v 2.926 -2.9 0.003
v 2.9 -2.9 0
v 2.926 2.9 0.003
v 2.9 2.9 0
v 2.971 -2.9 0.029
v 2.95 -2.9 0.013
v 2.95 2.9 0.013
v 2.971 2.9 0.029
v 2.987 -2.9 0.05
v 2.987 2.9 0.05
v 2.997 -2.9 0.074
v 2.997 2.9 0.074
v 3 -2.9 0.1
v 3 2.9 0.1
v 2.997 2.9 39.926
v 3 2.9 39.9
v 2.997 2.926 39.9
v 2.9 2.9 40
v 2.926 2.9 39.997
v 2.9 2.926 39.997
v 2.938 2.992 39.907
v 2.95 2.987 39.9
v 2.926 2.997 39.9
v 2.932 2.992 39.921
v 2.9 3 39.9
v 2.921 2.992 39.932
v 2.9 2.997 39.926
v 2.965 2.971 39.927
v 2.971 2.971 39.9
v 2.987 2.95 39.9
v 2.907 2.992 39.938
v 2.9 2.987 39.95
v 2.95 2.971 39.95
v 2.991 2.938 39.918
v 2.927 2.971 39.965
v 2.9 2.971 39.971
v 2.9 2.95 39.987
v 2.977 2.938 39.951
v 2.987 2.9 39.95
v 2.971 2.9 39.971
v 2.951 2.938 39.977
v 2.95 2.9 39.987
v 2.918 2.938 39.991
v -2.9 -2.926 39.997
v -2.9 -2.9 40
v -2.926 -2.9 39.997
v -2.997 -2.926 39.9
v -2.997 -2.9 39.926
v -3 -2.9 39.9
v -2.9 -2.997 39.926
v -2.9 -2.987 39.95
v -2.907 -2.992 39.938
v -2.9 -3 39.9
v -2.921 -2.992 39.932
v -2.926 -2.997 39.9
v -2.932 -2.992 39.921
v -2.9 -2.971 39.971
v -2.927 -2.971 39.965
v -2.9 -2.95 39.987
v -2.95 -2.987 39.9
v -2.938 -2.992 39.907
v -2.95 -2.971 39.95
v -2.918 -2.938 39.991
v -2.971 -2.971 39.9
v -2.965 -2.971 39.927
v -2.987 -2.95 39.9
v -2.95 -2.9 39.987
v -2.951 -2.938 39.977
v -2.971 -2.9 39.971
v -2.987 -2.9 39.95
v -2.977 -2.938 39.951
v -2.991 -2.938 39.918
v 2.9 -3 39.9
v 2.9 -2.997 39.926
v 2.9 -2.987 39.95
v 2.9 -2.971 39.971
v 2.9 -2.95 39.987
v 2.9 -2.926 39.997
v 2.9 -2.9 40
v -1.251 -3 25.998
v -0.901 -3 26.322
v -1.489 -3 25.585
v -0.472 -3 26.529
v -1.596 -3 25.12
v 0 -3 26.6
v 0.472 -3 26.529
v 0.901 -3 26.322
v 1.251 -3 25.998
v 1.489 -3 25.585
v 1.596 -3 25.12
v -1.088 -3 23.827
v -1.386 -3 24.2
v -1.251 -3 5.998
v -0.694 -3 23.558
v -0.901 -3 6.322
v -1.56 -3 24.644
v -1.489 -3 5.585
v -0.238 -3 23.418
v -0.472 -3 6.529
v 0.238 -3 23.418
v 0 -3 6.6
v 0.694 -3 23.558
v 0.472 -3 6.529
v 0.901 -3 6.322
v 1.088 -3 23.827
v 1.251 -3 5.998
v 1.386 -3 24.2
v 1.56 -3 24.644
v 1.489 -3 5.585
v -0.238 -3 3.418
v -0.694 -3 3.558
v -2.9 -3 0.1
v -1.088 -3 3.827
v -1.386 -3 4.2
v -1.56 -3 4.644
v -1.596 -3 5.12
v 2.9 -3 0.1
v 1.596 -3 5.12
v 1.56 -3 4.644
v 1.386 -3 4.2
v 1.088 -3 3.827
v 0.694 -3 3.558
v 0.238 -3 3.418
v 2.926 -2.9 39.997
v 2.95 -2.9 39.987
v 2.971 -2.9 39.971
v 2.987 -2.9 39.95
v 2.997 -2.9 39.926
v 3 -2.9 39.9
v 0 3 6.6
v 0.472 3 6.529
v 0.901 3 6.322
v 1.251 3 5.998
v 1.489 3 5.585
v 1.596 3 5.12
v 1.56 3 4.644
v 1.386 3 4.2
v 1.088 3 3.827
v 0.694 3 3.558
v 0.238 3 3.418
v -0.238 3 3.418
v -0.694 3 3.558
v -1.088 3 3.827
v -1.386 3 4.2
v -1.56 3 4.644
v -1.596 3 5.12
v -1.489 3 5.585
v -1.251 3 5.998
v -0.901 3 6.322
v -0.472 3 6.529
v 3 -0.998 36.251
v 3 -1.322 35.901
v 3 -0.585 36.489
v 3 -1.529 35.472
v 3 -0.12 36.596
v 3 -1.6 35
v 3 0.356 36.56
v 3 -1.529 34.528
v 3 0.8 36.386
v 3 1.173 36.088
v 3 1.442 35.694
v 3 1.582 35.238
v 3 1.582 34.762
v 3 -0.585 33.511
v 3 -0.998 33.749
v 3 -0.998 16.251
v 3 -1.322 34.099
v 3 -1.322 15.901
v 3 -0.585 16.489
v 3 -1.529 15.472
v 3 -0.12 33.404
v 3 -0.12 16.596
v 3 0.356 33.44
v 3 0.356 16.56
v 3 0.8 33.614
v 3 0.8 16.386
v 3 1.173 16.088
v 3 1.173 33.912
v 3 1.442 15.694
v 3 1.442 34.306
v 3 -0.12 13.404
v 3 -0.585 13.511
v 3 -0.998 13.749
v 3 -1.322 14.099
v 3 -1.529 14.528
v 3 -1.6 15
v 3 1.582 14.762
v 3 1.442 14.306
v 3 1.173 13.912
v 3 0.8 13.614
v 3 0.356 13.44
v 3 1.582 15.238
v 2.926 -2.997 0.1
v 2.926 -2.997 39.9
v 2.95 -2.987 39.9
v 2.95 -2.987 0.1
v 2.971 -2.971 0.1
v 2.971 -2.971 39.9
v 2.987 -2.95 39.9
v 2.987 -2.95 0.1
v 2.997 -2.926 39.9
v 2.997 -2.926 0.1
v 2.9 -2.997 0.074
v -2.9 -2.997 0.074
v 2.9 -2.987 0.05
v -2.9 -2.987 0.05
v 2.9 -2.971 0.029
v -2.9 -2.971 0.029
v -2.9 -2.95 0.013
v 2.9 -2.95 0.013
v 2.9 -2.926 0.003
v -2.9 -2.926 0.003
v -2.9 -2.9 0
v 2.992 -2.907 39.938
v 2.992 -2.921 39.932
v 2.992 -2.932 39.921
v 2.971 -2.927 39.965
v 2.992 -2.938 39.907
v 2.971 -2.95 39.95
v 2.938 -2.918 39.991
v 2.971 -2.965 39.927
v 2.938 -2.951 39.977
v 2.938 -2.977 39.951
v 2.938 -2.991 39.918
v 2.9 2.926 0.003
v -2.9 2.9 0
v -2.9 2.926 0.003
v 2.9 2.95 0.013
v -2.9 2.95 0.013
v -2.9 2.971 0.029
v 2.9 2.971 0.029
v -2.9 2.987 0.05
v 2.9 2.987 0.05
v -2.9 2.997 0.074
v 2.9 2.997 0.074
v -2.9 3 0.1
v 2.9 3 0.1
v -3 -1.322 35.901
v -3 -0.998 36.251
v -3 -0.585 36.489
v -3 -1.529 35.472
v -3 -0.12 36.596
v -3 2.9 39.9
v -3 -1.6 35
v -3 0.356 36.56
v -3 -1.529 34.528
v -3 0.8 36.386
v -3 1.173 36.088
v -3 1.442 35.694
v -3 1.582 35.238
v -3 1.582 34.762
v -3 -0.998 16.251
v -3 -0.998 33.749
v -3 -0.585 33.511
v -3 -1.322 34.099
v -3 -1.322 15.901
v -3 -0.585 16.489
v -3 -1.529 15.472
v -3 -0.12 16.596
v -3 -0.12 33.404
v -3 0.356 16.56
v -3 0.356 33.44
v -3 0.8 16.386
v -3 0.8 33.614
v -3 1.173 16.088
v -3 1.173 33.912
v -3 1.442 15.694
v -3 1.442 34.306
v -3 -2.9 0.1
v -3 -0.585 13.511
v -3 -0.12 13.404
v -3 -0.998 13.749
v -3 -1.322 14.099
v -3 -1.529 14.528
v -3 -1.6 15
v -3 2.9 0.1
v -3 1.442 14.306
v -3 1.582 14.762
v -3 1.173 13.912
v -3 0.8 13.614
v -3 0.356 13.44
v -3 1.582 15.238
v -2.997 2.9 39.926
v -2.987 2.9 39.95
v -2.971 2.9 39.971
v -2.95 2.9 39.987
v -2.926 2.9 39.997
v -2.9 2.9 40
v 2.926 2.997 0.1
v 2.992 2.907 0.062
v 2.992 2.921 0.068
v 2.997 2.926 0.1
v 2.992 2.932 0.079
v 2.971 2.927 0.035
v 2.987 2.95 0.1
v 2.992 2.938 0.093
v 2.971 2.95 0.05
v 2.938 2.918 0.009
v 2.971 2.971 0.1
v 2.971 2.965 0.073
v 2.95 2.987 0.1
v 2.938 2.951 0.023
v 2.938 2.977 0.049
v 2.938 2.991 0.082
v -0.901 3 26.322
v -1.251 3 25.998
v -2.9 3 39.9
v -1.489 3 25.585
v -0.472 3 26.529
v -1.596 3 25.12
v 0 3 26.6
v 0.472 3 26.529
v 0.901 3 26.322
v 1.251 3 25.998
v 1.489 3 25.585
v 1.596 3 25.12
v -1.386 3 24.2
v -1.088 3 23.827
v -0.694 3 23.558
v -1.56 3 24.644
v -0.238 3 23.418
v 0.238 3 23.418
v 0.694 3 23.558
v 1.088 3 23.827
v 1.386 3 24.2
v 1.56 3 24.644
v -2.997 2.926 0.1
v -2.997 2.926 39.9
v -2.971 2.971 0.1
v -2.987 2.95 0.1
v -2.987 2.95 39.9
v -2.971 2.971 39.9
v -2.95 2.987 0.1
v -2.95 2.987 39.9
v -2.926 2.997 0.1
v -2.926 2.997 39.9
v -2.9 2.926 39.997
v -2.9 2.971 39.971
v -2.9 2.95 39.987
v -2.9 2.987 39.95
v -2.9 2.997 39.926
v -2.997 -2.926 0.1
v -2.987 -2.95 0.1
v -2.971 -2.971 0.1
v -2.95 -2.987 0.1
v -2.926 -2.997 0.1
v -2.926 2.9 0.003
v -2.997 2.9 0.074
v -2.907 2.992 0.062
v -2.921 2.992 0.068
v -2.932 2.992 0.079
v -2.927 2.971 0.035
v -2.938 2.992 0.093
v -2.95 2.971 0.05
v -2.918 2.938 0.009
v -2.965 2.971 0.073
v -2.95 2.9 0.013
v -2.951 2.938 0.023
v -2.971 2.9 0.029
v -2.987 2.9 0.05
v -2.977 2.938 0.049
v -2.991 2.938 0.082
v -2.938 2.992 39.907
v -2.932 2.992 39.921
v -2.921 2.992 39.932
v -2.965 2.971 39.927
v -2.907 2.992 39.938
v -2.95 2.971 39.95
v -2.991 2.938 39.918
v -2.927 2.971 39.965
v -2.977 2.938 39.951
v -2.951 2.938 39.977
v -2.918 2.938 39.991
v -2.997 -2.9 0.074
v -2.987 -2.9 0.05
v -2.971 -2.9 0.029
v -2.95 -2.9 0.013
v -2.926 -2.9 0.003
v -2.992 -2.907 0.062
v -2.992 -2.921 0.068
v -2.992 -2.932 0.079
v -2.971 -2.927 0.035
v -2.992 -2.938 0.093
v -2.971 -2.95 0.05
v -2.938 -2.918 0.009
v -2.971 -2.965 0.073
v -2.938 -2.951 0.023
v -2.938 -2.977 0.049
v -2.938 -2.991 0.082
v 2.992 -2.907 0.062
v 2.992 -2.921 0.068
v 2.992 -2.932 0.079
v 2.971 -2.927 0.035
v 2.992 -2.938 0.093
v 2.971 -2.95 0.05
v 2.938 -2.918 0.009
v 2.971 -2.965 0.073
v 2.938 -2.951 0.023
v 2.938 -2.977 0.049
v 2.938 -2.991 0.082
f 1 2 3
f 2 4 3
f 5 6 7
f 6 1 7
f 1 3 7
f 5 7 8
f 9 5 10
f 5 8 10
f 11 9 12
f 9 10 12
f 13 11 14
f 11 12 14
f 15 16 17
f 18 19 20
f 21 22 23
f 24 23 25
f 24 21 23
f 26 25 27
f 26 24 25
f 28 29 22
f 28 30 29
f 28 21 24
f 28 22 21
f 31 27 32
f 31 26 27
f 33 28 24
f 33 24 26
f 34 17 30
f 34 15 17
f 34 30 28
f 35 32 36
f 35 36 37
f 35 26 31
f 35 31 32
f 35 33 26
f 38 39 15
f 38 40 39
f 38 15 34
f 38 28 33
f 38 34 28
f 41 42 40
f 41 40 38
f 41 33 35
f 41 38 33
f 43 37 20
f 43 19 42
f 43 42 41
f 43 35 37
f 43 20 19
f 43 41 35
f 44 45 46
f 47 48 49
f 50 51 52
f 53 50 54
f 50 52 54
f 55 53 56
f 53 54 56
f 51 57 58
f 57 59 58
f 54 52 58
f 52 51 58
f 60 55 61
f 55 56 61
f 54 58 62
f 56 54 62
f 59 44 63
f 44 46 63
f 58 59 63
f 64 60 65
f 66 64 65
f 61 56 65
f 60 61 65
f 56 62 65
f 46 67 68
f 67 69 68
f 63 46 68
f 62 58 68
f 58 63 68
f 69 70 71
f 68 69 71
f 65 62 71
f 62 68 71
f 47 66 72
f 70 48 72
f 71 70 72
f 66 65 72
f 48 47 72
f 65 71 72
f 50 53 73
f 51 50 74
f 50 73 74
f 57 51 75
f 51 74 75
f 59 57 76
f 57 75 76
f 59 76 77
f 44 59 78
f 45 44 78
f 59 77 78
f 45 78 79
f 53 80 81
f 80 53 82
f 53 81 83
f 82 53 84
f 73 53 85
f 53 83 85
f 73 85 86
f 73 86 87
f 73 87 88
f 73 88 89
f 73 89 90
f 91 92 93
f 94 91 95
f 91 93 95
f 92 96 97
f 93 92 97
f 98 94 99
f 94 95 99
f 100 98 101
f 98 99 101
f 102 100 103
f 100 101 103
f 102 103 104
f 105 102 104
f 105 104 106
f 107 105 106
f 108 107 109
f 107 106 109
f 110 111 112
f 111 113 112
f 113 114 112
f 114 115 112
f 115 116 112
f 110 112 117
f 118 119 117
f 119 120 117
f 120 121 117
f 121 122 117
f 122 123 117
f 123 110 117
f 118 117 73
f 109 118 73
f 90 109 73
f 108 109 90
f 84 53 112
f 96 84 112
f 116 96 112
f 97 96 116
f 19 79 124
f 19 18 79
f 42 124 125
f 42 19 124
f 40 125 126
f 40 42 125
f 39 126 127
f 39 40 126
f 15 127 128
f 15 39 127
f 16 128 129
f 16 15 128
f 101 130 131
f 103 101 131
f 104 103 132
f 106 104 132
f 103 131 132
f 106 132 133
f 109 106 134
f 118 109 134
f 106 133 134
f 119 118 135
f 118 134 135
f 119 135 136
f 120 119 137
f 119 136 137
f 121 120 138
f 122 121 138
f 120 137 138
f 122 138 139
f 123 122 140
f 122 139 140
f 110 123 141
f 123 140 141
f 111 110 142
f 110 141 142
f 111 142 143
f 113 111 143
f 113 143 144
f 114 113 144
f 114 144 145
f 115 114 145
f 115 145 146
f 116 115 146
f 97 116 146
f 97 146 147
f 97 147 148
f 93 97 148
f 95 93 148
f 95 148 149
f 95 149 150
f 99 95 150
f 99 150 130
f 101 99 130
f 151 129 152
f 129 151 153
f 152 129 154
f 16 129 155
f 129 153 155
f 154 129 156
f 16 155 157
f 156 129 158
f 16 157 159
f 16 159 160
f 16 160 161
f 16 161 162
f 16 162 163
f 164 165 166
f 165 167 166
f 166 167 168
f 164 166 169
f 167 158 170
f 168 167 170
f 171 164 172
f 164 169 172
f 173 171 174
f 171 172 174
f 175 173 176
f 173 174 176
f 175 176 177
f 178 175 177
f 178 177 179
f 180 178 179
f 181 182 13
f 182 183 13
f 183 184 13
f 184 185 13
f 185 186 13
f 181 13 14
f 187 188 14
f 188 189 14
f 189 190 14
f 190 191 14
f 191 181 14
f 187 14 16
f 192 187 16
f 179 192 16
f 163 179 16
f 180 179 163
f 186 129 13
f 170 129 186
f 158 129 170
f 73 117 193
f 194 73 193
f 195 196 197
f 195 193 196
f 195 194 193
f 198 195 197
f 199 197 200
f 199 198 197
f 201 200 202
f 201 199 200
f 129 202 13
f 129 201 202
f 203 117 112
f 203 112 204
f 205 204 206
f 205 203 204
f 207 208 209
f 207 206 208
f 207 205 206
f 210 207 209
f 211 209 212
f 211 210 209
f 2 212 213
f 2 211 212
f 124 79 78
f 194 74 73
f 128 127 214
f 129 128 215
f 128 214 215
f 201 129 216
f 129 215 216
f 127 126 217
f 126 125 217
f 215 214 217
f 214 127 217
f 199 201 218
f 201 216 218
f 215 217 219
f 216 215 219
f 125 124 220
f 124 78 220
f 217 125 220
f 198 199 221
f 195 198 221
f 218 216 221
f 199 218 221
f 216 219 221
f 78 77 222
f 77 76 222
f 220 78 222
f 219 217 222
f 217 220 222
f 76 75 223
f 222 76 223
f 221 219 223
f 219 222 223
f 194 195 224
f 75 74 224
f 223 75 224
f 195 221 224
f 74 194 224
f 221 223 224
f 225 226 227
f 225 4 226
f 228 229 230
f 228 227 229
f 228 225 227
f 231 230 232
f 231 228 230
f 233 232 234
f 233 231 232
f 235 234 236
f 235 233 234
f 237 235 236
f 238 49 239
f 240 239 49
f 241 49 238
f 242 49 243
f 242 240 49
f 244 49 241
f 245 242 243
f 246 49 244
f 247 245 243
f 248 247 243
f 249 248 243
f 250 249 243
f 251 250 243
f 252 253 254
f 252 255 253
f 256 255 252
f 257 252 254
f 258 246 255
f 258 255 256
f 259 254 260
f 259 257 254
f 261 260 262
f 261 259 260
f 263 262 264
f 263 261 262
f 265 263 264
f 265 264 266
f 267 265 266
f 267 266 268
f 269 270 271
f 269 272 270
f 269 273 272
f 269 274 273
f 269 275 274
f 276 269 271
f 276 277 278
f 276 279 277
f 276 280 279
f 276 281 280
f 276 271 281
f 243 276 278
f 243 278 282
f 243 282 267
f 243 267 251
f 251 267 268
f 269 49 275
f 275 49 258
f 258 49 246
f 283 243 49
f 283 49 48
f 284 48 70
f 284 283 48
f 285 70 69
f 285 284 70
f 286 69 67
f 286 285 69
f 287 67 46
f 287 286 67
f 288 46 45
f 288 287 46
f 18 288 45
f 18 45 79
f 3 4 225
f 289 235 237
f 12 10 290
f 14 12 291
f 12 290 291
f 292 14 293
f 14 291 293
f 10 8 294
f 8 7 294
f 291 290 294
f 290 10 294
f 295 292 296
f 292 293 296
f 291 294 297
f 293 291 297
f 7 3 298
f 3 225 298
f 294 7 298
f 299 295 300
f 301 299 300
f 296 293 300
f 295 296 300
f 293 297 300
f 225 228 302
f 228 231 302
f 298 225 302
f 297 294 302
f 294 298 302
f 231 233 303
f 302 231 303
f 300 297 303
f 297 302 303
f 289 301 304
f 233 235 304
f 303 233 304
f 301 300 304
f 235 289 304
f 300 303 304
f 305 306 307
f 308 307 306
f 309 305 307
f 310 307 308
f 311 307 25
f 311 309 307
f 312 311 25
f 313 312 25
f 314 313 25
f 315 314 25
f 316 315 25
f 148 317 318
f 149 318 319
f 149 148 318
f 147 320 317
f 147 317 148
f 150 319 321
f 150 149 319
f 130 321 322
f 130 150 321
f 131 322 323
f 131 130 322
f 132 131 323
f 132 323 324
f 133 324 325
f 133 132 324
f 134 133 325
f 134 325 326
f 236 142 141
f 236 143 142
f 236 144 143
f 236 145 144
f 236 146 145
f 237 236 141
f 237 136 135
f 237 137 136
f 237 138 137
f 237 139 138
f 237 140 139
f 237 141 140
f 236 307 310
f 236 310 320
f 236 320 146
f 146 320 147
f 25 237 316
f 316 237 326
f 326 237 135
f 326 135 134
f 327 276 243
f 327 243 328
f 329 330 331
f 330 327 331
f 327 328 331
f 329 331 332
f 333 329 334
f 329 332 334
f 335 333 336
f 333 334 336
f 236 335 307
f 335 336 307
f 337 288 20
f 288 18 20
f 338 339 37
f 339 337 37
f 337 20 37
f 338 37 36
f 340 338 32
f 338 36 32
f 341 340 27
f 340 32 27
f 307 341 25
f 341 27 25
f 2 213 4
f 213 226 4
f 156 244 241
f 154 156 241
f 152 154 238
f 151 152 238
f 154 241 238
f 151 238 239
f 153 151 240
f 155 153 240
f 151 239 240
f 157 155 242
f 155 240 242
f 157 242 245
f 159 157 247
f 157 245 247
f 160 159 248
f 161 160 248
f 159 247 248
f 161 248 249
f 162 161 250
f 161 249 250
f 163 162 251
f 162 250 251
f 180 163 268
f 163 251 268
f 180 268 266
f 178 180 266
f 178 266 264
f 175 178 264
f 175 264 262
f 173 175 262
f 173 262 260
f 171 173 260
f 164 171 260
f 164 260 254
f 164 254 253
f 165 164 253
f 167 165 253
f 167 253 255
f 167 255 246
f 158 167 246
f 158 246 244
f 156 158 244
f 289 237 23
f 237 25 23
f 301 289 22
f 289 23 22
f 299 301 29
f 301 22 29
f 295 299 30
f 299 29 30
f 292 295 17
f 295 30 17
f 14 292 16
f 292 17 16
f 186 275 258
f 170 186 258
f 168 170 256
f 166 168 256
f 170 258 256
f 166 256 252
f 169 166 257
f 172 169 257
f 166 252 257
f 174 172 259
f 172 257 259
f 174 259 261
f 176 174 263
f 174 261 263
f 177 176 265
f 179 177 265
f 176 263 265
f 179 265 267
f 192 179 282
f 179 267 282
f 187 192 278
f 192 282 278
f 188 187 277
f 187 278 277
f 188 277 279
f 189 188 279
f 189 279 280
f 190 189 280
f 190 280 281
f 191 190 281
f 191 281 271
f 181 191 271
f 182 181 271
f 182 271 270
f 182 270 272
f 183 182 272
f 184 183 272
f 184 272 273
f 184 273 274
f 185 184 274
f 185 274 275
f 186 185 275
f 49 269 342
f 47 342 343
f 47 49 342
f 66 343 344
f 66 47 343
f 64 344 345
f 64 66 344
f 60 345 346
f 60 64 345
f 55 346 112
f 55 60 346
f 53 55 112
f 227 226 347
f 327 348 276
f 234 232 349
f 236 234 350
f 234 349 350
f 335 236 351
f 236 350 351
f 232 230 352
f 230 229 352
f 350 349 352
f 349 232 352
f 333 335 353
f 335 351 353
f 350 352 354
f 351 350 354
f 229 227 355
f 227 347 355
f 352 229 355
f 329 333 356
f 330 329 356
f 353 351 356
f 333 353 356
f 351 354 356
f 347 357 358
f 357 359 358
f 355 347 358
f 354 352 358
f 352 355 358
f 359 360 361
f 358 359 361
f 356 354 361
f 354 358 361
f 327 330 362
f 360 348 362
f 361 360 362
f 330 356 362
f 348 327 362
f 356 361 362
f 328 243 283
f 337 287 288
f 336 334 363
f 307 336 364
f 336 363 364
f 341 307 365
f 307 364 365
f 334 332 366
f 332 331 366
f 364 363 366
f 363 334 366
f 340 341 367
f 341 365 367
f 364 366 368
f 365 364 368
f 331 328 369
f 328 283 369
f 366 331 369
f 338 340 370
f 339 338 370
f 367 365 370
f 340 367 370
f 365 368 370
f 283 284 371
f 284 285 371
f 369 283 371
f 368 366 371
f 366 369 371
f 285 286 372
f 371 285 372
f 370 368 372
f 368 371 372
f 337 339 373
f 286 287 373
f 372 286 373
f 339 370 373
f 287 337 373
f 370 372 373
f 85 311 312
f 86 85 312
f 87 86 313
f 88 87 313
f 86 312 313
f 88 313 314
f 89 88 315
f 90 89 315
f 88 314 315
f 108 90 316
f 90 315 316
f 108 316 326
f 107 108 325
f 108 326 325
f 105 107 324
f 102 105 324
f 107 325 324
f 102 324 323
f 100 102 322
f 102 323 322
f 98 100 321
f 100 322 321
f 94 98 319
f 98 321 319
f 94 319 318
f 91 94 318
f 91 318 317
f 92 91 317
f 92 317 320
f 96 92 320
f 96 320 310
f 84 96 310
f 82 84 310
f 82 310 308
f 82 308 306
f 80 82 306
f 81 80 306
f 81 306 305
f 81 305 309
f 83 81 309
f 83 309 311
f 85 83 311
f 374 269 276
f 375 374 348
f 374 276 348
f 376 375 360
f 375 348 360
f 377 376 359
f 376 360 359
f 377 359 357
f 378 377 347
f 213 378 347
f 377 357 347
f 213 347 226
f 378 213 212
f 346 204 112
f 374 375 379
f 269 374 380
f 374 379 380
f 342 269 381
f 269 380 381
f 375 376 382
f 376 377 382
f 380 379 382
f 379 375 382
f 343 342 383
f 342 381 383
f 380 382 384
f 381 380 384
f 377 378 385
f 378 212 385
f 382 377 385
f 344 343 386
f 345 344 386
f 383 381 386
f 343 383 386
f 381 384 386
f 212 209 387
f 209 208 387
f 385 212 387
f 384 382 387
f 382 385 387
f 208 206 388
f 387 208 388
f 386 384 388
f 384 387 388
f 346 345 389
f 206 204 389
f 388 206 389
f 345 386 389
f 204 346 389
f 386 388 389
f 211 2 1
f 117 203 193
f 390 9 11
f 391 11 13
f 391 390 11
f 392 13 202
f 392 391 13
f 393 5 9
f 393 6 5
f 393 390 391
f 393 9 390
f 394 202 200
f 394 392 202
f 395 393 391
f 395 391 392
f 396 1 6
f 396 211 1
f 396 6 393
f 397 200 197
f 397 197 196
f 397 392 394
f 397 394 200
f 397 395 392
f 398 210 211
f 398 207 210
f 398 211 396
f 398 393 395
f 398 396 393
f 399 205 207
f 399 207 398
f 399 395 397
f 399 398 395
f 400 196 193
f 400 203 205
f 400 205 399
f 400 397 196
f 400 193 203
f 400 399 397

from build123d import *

# Parameters (mm, degrees)
SKETCH_1_W          = 6
SKETCH_1_H          = 6
EXTRUDE_1_DEPTH     = 40
SKETCH_2_R          = 1.6
CUT_EXTRUDE_1_DEPTH = 40
SKETCH_3_R          = 1.6
CUT_EXTRUDE_2_DEPTH = 40
FILLET_1_R          = 0.1


with BuildPart() as part:
    # 草图1 → 凸台-拉伸1 (new body)
    with BuildSketch(Plane.XY):
        Rectangle(SKETCH_1_W, SKETCH_1_H)
    extrude(amount=EXTRUDE_1_DEPTH)

    # 草图2 → 切除-拉伸1 (cut)
    with BuildSketch(Plane.ZY.offset(3)):
        with Locations(Location((15, 0, 0), (0, 0, 270))):
            Circle(SKETCH_2_R)
        with Locations(Location((35, 0, 0), (0, 0, 270))):
            Circle(SKETCH_2_R)
    extrude(amount=-CUT_EXTRUDE_1_DEPTH, mode=Mode.SUBTRACT)

    # 草图3 → 切除-拉伸2 (cut)
    with BuildSketch(Plane(origin=(0, 3, 0), x_dir=(1, 0, 0), z_dir=(0, 1, 0))):
        with Locations(Location((0, -5, 0), (0, 0, 270))):
            Circle(SKETCH_3_R)
        with Locations(Location((0, -25, 0), (0, 0, 270))):
            Circle(SKETCH_3_R)
    extrude(amount=-CUT_EXTRUDE_2_DEPTH, mode=Mode.SUBTRACT)

    # 圆角1
    fillet_1_edges = [part.edges().sort_by_distance(p)[0] for p in [
        (-3, 0, 40),
        (0, -3, 40),
        (3, 0, 40),
        (0, -3, 0),
        (-3, 0, 0),
        (0, 3, 0),
        (3, 0, 0),
        (3, -3, 20),
        (-3, -3, 20),
        (-3, 3, 20),
        (3, 3, 20),
        (0, 3, 40),
    ]]
    fillet(fillet_1_edges, radius=FILLET_1_R)


solid = part.part
